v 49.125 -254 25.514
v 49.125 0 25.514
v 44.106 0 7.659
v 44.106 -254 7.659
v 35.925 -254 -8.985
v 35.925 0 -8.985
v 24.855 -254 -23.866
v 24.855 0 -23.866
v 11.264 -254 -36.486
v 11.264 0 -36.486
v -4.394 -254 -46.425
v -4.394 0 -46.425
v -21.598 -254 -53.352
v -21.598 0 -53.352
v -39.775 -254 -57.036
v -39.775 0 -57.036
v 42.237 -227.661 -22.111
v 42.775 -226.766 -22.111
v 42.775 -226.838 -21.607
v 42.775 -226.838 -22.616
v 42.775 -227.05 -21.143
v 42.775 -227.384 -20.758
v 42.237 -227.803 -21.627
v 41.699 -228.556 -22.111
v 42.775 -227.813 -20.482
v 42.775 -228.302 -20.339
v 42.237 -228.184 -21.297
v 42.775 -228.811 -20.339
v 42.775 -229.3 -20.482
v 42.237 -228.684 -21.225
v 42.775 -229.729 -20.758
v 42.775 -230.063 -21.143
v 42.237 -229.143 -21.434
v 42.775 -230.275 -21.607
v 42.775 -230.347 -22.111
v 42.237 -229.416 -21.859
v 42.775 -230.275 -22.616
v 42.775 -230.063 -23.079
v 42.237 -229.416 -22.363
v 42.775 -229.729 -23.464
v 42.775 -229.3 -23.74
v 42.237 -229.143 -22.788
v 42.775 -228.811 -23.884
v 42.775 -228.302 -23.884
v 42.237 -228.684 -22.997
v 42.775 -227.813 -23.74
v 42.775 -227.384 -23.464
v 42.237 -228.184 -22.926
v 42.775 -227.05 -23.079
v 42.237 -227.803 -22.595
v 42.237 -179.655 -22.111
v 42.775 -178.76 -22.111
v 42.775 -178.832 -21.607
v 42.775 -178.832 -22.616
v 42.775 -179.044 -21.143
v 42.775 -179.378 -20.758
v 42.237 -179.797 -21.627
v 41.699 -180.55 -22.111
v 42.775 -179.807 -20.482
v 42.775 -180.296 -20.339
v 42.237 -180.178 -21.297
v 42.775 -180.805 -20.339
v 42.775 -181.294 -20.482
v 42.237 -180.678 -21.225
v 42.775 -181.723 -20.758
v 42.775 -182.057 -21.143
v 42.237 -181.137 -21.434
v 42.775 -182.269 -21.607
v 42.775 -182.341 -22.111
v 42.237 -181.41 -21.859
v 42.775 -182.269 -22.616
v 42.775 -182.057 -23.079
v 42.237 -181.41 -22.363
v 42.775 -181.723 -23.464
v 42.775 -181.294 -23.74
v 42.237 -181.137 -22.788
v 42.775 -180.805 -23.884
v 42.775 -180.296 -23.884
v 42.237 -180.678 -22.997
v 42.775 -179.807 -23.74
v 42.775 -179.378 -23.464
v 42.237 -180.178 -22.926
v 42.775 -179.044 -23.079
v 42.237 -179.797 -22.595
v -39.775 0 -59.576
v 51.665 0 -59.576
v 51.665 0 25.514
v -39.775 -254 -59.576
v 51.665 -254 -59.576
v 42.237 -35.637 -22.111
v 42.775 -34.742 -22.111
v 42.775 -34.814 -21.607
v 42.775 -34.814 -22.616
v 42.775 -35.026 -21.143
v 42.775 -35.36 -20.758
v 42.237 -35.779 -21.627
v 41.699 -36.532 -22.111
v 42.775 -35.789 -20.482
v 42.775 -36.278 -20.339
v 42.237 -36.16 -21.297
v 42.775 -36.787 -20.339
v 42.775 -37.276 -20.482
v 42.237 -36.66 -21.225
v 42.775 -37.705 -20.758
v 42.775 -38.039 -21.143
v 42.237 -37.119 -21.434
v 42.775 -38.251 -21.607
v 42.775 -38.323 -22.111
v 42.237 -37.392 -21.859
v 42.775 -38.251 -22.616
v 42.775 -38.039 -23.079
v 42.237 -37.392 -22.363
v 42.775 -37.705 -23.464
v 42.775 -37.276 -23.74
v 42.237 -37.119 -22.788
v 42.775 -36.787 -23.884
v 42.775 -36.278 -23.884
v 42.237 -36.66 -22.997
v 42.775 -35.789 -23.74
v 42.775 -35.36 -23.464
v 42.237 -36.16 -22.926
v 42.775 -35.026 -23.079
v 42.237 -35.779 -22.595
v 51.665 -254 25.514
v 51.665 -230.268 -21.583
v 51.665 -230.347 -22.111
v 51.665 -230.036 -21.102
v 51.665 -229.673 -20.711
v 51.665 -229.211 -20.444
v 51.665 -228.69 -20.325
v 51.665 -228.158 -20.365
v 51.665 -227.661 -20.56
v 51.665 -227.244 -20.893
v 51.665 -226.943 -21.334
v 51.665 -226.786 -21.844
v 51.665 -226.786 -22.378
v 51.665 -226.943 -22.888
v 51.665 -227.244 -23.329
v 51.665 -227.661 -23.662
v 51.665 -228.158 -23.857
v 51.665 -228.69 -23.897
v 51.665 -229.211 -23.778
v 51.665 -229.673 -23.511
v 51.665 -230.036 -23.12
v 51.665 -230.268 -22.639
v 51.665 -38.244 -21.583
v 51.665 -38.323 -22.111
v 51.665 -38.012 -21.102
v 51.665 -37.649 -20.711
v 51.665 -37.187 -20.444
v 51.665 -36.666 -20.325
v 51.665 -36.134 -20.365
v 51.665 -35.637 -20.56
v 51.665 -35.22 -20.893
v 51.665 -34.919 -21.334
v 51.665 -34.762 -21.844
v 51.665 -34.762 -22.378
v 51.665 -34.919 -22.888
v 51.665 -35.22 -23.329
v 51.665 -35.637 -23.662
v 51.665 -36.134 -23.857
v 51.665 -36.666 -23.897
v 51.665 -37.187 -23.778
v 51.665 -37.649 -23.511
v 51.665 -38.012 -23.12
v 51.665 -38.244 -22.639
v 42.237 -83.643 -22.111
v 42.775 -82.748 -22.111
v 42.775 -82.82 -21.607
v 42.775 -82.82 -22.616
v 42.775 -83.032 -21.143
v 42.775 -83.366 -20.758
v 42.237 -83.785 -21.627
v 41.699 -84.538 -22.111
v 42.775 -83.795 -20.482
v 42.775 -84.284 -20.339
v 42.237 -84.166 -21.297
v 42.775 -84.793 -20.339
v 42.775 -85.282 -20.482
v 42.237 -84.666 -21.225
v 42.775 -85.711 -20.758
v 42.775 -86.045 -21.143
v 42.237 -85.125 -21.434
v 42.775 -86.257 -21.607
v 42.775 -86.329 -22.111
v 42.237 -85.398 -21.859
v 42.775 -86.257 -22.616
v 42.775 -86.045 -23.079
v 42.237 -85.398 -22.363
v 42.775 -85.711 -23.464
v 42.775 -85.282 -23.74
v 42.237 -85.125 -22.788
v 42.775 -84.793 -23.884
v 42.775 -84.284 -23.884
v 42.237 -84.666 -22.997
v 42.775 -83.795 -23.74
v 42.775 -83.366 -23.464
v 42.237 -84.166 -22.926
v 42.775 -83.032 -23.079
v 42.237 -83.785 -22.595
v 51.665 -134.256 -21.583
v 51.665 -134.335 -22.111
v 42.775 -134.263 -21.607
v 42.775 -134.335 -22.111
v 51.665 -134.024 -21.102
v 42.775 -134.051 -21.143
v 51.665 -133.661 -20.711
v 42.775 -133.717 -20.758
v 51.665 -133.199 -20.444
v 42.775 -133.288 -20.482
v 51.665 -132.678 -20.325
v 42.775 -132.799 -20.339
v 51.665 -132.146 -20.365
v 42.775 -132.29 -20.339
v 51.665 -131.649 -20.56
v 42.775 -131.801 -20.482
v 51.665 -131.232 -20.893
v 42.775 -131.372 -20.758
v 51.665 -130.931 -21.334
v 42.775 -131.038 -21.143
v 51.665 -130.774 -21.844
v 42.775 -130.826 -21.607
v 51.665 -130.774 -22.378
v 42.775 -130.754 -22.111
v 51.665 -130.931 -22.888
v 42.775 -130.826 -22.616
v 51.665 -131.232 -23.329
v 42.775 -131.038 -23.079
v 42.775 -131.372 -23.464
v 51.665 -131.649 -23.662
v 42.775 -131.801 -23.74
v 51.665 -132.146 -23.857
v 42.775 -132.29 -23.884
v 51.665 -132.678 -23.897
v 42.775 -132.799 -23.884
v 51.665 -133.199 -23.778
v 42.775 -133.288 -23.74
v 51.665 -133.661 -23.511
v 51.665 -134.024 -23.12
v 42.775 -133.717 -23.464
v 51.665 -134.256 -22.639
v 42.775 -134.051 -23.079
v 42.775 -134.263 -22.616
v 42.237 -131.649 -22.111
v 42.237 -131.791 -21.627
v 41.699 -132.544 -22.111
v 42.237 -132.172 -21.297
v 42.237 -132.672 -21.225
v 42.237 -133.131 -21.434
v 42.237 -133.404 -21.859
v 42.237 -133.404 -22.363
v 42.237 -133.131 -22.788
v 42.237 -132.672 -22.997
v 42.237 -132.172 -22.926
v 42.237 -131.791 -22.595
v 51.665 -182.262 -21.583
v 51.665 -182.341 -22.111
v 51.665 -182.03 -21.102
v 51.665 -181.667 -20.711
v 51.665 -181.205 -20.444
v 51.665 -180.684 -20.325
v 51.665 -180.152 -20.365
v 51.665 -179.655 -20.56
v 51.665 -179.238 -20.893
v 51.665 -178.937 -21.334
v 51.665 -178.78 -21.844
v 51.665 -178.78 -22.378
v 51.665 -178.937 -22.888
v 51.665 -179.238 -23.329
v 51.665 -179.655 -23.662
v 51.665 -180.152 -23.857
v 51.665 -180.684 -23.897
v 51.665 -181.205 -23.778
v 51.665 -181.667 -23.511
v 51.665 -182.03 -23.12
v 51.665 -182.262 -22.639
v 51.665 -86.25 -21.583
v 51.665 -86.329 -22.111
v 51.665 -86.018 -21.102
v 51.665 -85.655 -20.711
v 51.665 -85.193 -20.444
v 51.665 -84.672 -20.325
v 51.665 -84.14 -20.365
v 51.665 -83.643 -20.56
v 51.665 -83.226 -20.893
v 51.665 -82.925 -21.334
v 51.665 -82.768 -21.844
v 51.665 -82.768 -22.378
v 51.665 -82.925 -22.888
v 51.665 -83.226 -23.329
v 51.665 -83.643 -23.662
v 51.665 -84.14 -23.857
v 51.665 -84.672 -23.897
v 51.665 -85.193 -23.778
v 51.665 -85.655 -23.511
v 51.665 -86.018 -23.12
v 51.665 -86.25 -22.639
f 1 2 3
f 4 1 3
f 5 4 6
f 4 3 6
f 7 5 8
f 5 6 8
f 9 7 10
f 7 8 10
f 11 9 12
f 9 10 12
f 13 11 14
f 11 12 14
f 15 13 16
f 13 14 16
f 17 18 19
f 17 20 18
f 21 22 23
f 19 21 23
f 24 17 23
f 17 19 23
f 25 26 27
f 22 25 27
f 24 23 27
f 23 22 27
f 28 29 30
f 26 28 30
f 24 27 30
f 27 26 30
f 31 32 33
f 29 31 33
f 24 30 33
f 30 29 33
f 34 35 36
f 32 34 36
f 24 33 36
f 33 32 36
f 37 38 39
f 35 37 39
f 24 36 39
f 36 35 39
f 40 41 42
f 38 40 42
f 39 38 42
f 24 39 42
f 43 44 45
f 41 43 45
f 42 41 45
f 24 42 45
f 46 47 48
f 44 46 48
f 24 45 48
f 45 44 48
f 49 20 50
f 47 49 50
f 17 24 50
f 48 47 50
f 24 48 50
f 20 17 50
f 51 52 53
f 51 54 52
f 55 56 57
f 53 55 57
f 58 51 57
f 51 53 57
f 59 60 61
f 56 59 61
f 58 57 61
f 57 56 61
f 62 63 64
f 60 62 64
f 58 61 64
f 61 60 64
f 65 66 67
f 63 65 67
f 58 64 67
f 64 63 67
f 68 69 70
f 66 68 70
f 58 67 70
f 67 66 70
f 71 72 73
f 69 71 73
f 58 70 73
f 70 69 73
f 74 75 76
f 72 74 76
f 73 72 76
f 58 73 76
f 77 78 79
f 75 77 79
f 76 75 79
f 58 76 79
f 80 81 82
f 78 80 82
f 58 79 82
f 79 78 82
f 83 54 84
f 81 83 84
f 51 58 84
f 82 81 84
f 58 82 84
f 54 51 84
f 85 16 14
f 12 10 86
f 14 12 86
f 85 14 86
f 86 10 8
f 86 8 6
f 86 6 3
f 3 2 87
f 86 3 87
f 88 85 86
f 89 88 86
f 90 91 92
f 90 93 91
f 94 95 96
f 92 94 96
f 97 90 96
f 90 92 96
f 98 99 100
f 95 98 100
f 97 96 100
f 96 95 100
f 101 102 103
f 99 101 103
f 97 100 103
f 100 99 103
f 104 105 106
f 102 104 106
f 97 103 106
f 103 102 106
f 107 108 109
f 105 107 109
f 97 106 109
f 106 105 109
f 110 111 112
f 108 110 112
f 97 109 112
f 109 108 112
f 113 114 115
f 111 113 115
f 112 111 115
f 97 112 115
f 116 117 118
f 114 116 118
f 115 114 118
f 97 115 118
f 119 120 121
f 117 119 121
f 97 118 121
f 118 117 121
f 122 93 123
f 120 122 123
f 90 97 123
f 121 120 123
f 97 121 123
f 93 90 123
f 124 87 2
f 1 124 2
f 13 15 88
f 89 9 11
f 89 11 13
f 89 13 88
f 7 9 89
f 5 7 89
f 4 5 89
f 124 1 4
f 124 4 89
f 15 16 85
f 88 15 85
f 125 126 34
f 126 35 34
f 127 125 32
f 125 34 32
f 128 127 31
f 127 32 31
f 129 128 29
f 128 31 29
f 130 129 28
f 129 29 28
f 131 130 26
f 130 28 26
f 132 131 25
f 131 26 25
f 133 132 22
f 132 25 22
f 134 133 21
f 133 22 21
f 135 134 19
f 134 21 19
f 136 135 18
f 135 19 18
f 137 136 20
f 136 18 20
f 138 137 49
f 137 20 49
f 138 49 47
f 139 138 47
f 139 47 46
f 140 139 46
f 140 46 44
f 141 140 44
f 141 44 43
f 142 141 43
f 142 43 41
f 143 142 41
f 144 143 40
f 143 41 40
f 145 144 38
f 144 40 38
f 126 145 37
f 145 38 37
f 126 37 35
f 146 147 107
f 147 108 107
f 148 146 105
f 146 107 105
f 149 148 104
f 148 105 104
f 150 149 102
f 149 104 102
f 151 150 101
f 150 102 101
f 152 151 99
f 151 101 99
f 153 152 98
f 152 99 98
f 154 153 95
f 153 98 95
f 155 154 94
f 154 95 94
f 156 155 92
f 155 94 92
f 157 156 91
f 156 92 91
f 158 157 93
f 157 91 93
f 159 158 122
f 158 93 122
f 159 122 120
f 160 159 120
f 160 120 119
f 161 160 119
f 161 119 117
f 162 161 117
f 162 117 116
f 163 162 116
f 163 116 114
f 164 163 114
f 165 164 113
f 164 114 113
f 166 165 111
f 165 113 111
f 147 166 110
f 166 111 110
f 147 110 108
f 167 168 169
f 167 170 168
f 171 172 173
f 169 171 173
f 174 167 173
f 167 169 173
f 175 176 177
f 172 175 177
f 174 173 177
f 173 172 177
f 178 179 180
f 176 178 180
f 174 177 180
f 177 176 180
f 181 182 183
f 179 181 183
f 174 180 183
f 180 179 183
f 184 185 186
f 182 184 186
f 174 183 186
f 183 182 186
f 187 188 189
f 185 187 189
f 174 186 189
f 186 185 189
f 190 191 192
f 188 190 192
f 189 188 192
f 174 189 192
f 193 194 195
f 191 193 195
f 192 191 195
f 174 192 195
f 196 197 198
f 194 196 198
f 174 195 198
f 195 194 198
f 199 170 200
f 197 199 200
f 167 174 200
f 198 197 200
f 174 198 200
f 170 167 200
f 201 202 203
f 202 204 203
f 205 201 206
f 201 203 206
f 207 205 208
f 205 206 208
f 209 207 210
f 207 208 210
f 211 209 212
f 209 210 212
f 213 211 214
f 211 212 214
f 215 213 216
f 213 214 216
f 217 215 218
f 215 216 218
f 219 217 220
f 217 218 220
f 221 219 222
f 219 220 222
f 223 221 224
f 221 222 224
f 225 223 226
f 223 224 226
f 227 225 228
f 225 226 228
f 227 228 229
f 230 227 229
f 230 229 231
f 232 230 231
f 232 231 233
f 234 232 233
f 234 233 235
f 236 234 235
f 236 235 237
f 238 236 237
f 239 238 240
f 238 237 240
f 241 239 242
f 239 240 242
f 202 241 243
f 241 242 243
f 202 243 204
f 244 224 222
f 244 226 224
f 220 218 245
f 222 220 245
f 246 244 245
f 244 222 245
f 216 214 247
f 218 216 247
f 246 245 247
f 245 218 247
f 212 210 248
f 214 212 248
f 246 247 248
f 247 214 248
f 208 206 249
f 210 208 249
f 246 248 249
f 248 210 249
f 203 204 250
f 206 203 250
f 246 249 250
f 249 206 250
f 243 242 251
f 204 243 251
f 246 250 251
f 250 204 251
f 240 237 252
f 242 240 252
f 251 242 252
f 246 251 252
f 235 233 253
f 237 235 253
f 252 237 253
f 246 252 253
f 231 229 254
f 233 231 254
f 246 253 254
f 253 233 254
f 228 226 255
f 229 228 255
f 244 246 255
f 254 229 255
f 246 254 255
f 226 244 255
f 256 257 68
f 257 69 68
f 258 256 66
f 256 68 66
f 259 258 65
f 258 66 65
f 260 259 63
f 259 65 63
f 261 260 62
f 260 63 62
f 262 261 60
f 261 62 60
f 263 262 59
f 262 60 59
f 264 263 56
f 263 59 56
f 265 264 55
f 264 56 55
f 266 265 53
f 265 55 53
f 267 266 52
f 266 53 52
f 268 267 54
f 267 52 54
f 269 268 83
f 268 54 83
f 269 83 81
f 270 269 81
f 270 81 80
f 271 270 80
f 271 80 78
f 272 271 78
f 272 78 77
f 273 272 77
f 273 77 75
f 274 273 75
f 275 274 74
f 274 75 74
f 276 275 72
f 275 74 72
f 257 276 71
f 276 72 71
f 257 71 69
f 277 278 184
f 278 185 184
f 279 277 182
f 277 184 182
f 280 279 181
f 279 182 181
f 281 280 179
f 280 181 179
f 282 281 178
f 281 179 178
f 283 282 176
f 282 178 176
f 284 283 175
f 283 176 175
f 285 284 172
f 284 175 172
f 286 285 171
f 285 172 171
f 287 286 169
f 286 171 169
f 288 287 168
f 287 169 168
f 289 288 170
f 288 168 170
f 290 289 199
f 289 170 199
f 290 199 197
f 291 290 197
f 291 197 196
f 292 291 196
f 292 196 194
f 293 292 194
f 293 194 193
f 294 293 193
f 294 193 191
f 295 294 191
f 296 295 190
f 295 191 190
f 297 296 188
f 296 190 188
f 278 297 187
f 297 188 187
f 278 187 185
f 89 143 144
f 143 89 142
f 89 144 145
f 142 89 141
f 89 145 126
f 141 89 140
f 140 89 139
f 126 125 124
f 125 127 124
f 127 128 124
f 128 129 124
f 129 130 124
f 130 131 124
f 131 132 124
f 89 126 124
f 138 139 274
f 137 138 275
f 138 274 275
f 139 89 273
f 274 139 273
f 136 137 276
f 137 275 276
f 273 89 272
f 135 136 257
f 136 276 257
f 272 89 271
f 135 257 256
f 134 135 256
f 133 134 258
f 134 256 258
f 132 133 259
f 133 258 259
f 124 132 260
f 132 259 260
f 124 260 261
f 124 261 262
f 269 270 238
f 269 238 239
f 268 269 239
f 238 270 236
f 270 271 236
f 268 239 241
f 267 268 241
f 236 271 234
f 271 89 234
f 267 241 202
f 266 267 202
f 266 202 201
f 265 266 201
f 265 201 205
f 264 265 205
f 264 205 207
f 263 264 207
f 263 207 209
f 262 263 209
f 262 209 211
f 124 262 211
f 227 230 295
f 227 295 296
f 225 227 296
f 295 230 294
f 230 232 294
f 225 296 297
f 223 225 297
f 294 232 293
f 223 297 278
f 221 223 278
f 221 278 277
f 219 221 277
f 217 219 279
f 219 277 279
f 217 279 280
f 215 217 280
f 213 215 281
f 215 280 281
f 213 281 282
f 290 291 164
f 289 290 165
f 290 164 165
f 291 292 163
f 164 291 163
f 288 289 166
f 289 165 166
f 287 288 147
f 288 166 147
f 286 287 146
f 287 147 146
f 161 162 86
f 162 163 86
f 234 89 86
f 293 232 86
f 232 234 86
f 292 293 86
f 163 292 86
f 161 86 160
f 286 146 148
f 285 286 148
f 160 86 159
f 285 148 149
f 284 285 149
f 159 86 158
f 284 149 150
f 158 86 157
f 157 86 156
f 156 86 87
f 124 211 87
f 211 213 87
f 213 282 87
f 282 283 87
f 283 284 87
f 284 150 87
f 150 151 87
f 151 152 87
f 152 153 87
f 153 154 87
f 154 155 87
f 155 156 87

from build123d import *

# Parameters (mm, degrees)
F1_DEPTH = 254
F3_D     = 3.5814
F3_DEPTH = 19.05
F3_TIP   = 1.0759611105
F4_DEPTH = 10.16
F5_DEPTH = 10.16


with BuildPart() as f1:
    # F0 (on Front) → F1 (new body)
    with BuildSketch(Plane.XZ):
        Polygon((49.1248931152, -56.7675527828), (-39.7751068848, -57.0361235134), (48.4362465841, -57.0361235134), (49.1248931152, -57.0361235134), align=None)
        with BuildLine():
            ThreePointArc((49.1248931152, 25.5138764866), (18.3482789064, -30.4863082116), (-39.7751068848, -57.0361235134))
            Line((-39.7751068848, -57.0361235134), (49.1248931152, -56.7675527828))
            Line((49.1248931152, -56.7675527828), (49.1248931152, 25.5138764866))
        make_face()
        Polygon((48.4362465841, -57.0361235134), (-39.7751068848, -57.0361235134), (-39.7751068848, -69.7361235134), (61.8248931152, -69.7361235134), (61.8248931152, -57.0361235134), (55.4748931152, -57.0361235134), (49.1248931152, -57.0361235134), align=None)
        Polygon((49.1248931152, 25.5138764866), (49.1248931152, -56.7675527828), (49.1248931152, -57.0361235134), (55.4748931152, -57.0361235134), (61.8248931152, -57.0361235134), (61.8248931152, 25.5138764866), align=None)
    extrude(amount=F1_DEPTH)

    # F3
    with Locations(Plane.YZ.offset(61.8248931152)):
        with Locations((-228.5564392805, -22.1111235134), (-180.5504392805, -22.1111235134), (-132.5444392805, -22.1111235134), (-84.5384392805, -22.1111235134), (-36.5324392805, -22.1111235134)):
            Hole(F3_D / 2, depth=F3_DEPTH)
            with Locations((0, 0, -(F3_DEPTH + F3_TIP / 2))):  # 118° drill point
                Cone(0, F3_D / 2, F3_TIP, mode=Mode.SUBTRACT)

    # F4 (cut): a face of the model
    f4_faces = [f1.faces().sort_by_distance(p)[0] for p in [
        (61.8248931152, -126.9884327642, -22.1111235134),
    ]]
    extrude(f4_faces, amount=-F4_DEPTH, mode=Mode.SUBTRACT)

    # F5 (cut): a face of the model
    f5_faces = [f1.faces().sort_by_distance(p)[0] for p in [
        (5.9448931152, -127, -69.7361235134),
    ]]
    extrude(f5_faces, amount=-F5_DEPTH, mode=Mode.SUBTRACT)


solid = f1.part
